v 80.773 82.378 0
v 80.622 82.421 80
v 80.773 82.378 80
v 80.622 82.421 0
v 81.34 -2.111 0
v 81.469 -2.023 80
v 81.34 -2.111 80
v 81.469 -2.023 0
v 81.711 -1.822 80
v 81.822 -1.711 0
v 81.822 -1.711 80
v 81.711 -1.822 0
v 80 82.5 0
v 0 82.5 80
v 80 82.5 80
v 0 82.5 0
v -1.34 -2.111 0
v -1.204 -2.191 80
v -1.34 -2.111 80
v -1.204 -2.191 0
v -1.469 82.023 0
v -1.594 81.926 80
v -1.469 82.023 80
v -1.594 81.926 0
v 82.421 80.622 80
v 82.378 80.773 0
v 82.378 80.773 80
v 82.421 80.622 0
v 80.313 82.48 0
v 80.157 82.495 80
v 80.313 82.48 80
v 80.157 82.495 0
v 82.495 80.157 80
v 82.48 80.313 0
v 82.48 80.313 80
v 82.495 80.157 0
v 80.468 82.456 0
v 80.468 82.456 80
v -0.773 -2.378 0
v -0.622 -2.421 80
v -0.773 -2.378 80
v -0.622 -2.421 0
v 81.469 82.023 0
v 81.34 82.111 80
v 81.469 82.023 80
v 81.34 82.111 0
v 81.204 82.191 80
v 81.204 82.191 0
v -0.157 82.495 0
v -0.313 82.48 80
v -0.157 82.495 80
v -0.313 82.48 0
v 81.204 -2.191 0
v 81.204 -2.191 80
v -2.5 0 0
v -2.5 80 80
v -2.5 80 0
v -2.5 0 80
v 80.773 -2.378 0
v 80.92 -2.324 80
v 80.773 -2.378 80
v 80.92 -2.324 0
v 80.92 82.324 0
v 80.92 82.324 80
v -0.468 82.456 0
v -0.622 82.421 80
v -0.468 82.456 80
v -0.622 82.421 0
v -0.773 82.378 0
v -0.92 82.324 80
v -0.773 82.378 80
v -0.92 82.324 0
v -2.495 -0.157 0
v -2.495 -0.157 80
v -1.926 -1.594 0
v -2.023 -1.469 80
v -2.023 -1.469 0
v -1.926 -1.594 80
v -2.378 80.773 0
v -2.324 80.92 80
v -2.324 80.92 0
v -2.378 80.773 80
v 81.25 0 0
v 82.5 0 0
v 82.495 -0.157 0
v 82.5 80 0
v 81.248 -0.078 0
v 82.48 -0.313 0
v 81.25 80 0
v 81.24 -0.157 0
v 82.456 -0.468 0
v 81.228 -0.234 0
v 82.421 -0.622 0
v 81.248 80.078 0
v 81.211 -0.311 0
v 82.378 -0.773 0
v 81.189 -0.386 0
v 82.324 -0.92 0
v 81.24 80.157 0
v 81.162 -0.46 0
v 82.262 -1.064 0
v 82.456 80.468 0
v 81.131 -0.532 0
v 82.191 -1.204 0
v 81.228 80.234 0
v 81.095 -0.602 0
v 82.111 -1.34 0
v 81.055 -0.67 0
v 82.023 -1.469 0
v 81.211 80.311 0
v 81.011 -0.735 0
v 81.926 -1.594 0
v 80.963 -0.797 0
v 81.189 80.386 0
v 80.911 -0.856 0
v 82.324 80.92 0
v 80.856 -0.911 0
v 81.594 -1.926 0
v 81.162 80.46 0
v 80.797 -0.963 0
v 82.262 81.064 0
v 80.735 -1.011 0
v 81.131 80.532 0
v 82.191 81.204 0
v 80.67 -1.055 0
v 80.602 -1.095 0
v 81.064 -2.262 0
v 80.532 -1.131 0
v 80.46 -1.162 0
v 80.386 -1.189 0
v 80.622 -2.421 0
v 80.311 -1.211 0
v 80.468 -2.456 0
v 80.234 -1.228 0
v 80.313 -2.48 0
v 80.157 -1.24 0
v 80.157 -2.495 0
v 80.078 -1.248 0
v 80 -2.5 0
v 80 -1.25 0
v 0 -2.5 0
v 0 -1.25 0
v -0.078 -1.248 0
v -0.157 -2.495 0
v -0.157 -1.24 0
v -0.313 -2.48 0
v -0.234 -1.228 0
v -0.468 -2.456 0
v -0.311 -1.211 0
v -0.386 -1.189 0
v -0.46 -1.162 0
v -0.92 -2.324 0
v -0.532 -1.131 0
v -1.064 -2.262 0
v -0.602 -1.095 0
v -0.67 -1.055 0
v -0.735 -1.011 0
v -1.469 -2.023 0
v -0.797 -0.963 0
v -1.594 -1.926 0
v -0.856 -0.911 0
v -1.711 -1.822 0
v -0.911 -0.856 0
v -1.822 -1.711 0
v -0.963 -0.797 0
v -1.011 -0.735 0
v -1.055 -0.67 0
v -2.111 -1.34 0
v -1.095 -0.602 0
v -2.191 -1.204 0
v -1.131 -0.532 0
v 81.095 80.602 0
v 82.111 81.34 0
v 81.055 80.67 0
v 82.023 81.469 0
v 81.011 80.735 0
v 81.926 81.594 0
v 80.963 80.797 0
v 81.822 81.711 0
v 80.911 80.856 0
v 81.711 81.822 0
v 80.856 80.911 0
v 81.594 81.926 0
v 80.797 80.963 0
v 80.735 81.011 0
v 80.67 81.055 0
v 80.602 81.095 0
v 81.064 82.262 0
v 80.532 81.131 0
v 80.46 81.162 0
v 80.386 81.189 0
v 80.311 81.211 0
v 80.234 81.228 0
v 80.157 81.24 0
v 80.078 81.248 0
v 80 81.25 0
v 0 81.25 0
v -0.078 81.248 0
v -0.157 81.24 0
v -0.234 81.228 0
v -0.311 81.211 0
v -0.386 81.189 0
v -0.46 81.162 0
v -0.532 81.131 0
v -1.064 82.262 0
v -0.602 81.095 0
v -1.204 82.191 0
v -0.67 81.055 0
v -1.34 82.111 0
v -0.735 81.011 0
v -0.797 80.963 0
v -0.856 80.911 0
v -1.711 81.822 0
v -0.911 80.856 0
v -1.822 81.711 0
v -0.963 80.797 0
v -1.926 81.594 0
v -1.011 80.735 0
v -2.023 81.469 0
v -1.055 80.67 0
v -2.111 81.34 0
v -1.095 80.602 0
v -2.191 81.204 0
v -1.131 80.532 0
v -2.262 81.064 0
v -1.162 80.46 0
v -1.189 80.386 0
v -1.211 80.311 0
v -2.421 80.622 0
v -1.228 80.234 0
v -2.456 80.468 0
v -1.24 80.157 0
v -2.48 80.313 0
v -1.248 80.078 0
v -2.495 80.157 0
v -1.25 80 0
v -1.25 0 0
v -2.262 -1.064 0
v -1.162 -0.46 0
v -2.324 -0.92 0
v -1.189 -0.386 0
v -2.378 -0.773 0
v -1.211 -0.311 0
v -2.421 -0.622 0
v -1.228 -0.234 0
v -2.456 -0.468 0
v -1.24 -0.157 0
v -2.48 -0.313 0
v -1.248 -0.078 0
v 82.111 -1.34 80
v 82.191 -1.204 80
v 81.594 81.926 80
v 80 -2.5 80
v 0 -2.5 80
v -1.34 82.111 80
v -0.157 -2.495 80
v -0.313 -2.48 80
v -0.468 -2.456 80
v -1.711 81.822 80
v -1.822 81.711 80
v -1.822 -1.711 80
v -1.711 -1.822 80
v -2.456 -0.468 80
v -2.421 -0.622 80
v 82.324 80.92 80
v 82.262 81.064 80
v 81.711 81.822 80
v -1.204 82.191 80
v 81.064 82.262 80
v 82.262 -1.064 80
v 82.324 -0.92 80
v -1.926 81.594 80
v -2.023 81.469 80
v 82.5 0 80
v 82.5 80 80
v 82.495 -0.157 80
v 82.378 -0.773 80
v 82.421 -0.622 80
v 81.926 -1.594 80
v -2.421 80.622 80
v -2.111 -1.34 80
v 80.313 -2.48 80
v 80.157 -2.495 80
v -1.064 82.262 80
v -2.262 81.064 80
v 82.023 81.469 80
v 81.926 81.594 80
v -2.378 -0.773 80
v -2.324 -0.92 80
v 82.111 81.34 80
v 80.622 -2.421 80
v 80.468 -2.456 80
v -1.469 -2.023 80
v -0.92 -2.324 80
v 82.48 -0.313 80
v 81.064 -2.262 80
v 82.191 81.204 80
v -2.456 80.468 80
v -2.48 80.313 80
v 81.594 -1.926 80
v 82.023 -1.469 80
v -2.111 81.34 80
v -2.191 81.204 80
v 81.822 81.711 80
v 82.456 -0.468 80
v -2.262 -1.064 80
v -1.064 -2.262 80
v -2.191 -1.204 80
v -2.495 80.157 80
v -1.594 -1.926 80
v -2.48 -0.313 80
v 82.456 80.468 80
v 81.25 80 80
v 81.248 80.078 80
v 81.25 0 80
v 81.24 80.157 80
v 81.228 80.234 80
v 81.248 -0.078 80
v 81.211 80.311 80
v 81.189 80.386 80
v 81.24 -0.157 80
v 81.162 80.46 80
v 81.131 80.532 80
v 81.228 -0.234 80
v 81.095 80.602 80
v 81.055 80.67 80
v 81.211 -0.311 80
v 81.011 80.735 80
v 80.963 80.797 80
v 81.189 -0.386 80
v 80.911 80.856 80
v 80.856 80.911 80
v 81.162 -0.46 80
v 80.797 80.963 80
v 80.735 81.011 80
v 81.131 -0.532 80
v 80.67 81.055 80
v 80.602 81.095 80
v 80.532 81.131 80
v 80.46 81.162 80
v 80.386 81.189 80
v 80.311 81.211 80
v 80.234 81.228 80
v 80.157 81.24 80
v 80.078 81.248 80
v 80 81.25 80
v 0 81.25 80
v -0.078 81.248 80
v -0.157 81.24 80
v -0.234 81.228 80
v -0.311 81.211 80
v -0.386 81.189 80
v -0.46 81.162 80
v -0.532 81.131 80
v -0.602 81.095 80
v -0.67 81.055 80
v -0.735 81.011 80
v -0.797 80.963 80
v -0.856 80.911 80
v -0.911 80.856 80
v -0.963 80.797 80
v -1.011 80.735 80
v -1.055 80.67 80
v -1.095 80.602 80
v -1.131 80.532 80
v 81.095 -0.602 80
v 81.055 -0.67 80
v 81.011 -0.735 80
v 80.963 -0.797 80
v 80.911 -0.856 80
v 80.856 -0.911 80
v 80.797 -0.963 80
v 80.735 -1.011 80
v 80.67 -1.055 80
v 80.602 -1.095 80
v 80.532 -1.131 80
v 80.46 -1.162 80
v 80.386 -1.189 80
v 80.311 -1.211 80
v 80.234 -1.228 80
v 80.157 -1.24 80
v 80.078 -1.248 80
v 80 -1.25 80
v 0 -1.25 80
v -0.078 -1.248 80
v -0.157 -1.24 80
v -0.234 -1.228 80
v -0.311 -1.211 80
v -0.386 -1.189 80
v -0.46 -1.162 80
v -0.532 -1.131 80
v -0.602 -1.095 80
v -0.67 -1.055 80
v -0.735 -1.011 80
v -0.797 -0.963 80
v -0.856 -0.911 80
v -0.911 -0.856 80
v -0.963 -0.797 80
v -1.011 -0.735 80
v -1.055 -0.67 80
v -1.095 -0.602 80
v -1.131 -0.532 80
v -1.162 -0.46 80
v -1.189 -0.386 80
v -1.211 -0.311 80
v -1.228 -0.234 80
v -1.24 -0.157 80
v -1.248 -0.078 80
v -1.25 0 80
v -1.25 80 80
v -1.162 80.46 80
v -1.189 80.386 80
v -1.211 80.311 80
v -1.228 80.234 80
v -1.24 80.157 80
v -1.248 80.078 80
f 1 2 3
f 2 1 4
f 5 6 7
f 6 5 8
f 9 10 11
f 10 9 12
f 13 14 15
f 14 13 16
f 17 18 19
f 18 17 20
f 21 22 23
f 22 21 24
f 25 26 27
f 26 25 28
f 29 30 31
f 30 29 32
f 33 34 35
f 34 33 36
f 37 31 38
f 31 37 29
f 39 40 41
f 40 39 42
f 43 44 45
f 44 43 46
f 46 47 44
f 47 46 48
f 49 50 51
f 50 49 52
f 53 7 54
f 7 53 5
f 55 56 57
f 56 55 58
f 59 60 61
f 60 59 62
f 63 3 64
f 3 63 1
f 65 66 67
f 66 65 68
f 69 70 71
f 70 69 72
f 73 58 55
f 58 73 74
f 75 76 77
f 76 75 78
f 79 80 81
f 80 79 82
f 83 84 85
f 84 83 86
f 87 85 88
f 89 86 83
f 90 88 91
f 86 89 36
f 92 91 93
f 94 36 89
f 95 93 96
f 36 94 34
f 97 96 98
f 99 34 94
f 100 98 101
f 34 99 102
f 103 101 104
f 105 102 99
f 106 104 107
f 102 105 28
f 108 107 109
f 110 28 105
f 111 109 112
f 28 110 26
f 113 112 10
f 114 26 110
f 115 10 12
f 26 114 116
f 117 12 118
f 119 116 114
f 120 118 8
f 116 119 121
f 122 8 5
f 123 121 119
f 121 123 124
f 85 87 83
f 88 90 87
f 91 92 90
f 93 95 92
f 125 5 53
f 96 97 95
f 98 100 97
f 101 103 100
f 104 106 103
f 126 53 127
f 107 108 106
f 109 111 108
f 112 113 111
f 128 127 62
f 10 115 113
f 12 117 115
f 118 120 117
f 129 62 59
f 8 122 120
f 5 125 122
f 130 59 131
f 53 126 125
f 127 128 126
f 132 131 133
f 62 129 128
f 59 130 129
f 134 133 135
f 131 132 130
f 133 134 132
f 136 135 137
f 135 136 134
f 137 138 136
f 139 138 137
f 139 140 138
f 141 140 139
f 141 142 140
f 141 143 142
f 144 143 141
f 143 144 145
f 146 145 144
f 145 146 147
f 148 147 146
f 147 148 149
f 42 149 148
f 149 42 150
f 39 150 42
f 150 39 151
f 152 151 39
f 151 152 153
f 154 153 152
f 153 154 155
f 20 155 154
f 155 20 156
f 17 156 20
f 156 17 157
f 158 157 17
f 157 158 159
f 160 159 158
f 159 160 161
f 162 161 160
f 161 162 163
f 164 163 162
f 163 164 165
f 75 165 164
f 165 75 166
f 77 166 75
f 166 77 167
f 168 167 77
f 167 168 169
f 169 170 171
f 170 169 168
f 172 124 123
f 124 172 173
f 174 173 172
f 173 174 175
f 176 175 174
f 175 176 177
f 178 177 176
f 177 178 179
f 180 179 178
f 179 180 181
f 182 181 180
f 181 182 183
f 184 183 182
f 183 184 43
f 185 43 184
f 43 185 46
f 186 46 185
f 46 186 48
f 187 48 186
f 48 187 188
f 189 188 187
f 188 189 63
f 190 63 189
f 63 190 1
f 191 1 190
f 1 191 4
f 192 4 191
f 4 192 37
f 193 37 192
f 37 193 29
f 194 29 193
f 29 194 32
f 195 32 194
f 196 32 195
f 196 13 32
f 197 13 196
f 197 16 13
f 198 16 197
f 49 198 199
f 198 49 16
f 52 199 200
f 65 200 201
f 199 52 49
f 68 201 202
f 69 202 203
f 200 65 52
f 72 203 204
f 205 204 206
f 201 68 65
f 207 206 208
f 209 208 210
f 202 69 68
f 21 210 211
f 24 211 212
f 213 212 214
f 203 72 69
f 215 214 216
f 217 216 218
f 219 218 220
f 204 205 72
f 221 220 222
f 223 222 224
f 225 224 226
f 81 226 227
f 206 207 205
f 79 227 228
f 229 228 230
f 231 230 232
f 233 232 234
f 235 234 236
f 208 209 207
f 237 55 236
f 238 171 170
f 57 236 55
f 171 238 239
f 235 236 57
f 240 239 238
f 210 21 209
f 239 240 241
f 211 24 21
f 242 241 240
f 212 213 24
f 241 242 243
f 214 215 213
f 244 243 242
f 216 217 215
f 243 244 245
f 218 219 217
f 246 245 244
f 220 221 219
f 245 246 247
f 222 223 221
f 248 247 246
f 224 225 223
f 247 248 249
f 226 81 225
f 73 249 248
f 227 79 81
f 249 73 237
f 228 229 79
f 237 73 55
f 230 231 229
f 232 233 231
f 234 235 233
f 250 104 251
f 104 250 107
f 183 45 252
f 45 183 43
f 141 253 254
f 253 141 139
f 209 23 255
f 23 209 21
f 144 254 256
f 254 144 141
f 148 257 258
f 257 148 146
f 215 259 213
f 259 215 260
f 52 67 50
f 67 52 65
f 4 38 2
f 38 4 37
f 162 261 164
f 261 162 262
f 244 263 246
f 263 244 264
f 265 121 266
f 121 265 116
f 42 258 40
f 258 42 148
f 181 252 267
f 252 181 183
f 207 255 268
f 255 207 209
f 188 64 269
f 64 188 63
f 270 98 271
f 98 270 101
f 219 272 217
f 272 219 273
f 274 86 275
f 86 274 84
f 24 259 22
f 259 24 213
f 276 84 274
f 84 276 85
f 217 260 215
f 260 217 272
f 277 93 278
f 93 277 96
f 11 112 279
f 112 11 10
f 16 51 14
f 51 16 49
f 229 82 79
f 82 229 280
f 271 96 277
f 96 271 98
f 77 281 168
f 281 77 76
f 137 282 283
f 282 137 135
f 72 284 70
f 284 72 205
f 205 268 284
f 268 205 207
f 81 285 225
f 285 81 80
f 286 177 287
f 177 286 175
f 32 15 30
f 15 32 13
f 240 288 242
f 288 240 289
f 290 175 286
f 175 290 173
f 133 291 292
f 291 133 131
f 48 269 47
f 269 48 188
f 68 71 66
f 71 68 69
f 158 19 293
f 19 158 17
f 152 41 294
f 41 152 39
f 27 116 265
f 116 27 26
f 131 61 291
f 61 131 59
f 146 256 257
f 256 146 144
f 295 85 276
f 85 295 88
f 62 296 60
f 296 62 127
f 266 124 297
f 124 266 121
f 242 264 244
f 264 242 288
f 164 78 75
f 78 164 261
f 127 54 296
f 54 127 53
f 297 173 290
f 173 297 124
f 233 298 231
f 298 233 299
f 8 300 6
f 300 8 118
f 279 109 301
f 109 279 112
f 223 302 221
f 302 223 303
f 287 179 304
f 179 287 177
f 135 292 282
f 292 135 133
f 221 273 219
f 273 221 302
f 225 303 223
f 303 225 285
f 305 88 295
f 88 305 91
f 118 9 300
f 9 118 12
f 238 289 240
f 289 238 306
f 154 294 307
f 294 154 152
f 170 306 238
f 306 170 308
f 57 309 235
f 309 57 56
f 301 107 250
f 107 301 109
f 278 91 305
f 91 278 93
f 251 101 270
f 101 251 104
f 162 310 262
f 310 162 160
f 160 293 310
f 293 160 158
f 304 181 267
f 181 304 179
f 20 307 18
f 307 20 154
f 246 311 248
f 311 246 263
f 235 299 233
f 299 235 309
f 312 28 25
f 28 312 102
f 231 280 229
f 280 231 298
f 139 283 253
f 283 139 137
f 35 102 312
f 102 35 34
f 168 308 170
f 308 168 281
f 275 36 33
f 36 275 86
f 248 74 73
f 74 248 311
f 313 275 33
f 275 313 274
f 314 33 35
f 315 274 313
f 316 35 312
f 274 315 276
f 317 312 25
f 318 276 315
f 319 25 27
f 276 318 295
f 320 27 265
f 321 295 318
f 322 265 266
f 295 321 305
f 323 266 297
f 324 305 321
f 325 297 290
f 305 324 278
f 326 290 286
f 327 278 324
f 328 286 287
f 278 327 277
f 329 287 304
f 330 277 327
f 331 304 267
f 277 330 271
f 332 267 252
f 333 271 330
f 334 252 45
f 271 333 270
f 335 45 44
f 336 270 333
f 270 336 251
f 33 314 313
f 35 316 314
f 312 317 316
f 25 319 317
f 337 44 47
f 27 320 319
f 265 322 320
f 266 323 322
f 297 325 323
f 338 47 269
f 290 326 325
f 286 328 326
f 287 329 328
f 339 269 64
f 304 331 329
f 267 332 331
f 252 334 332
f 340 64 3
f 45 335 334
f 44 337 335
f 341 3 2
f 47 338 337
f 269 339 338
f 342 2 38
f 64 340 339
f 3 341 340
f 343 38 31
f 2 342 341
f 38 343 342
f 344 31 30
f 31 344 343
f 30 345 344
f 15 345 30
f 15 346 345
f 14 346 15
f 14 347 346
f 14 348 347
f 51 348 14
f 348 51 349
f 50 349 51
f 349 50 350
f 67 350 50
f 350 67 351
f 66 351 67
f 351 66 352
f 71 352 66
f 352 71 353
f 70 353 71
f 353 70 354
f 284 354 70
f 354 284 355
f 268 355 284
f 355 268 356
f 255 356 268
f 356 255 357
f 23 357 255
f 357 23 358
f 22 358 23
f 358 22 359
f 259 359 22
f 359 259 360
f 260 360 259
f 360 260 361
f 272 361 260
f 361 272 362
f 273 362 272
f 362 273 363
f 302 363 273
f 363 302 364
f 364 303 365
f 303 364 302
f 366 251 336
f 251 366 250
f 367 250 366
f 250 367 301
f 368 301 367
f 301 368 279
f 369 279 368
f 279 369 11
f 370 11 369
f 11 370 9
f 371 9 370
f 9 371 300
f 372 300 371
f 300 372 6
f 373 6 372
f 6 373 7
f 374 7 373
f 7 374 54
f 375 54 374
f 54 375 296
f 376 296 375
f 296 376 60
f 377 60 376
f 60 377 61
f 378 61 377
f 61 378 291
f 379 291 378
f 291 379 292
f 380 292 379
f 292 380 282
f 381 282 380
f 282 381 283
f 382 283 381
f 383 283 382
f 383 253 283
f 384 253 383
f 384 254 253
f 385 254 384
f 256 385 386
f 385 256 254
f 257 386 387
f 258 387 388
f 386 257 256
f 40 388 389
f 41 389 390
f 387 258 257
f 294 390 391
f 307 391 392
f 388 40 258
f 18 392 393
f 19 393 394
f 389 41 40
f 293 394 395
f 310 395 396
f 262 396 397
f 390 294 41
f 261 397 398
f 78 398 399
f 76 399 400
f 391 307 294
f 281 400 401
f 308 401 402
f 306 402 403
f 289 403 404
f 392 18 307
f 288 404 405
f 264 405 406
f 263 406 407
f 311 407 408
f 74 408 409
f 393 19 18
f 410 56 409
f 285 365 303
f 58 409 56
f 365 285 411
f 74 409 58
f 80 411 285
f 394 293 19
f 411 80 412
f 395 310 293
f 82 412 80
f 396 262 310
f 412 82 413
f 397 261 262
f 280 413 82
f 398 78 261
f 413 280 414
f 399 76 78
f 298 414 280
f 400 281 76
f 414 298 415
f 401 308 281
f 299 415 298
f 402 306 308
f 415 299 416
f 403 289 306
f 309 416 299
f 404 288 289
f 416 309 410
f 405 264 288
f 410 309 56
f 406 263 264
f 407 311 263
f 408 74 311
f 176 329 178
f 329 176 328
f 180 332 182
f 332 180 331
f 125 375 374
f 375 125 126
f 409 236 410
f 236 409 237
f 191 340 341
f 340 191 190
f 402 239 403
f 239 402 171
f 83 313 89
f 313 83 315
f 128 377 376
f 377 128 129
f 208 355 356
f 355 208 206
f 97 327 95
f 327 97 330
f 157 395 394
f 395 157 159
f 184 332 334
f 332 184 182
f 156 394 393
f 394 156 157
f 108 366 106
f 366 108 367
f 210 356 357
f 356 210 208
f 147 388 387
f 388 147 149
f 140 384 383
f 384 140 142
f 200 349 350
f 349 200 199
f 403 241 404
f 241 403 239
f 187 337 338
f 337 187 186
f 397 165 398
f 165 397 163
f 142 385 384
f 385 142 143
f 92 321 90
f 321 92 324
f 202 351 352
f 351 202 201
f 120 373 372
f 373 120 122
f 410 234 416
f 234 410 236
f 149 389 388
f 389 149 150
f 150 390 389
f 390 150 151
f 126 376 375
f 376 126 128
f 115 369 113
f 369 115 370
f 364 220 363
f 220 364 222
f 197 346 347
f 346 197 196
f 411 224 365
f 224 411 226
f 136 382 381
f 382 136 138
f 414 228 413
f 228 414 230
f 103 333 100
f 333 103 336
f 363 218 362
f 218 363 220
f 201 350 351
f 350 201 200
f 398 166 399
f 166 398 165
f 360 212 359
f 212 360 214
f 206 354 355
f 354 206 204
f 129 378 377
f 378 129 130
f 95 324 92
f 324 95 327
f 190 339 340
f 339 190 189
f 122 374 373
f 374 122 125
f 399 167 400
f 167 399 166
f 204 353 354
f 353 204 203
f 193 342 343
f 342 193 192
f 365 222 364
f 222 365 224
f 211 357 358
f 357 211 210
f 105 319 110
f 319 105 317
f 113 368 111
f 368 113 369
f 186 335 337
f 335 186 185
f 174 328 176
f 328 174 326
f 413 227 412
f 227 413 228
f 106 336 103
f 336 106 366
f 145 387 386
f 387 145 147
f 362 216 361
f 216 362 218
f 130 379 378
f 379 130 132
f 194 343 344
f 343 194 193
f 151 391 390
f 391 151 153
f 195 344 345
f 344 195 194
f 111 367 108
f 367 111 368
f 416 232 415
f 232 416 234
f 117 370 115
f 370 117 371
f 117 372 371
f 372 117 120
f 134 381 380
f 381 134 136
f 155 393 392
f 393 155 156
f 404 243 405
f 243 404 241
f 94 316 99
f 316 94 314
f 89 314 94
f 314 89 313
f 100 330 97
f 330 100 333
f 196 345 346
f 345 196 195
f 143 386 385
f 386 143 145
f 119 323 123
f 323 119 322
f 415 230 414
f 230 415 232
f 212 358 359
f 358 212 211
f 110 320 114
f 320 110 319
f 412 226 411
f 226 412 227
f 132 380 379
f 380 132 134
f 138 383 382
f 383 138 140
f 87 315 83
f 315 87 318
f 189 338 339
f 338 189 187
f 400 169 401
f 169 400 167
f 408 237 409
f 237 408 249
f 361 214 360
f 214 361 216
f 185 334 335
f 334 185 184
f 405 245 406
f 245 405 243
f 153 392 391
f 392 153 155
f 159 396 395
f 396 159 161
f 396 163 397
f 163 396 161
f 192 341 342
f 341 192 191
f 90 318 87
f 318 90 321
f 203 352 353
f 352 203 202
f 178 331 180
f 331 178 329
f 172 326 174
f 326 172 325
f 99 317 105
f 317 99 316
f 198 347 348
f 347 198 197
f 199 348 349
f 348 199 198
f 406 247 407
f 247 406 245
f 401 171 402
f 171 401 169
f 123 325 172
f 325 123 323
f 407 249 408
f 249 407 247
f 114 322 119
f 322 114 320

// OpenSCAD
$fn = 100;

module rounded_box(width, height, camfer) {
  hull() {
    translate([width, 0, 0])     { cylinder(height, camfer, camfer); }
    translate([0, width, 0])     { cylinder(height, camfer, camfer); }
    translate([width, width, 0]) { cylinder(height, camfer, camfer); }
    translate([0, 0, 0])         { cylinder(height, camfer, camfer); }
  }
}
module chasis(a, b) {
  difference() {
    rounded_box(a, b, camfer = 2.5);
    color("blue") rounded_box(a, b, camfer = 1.25);
  }
}

chasis(80, 80);
